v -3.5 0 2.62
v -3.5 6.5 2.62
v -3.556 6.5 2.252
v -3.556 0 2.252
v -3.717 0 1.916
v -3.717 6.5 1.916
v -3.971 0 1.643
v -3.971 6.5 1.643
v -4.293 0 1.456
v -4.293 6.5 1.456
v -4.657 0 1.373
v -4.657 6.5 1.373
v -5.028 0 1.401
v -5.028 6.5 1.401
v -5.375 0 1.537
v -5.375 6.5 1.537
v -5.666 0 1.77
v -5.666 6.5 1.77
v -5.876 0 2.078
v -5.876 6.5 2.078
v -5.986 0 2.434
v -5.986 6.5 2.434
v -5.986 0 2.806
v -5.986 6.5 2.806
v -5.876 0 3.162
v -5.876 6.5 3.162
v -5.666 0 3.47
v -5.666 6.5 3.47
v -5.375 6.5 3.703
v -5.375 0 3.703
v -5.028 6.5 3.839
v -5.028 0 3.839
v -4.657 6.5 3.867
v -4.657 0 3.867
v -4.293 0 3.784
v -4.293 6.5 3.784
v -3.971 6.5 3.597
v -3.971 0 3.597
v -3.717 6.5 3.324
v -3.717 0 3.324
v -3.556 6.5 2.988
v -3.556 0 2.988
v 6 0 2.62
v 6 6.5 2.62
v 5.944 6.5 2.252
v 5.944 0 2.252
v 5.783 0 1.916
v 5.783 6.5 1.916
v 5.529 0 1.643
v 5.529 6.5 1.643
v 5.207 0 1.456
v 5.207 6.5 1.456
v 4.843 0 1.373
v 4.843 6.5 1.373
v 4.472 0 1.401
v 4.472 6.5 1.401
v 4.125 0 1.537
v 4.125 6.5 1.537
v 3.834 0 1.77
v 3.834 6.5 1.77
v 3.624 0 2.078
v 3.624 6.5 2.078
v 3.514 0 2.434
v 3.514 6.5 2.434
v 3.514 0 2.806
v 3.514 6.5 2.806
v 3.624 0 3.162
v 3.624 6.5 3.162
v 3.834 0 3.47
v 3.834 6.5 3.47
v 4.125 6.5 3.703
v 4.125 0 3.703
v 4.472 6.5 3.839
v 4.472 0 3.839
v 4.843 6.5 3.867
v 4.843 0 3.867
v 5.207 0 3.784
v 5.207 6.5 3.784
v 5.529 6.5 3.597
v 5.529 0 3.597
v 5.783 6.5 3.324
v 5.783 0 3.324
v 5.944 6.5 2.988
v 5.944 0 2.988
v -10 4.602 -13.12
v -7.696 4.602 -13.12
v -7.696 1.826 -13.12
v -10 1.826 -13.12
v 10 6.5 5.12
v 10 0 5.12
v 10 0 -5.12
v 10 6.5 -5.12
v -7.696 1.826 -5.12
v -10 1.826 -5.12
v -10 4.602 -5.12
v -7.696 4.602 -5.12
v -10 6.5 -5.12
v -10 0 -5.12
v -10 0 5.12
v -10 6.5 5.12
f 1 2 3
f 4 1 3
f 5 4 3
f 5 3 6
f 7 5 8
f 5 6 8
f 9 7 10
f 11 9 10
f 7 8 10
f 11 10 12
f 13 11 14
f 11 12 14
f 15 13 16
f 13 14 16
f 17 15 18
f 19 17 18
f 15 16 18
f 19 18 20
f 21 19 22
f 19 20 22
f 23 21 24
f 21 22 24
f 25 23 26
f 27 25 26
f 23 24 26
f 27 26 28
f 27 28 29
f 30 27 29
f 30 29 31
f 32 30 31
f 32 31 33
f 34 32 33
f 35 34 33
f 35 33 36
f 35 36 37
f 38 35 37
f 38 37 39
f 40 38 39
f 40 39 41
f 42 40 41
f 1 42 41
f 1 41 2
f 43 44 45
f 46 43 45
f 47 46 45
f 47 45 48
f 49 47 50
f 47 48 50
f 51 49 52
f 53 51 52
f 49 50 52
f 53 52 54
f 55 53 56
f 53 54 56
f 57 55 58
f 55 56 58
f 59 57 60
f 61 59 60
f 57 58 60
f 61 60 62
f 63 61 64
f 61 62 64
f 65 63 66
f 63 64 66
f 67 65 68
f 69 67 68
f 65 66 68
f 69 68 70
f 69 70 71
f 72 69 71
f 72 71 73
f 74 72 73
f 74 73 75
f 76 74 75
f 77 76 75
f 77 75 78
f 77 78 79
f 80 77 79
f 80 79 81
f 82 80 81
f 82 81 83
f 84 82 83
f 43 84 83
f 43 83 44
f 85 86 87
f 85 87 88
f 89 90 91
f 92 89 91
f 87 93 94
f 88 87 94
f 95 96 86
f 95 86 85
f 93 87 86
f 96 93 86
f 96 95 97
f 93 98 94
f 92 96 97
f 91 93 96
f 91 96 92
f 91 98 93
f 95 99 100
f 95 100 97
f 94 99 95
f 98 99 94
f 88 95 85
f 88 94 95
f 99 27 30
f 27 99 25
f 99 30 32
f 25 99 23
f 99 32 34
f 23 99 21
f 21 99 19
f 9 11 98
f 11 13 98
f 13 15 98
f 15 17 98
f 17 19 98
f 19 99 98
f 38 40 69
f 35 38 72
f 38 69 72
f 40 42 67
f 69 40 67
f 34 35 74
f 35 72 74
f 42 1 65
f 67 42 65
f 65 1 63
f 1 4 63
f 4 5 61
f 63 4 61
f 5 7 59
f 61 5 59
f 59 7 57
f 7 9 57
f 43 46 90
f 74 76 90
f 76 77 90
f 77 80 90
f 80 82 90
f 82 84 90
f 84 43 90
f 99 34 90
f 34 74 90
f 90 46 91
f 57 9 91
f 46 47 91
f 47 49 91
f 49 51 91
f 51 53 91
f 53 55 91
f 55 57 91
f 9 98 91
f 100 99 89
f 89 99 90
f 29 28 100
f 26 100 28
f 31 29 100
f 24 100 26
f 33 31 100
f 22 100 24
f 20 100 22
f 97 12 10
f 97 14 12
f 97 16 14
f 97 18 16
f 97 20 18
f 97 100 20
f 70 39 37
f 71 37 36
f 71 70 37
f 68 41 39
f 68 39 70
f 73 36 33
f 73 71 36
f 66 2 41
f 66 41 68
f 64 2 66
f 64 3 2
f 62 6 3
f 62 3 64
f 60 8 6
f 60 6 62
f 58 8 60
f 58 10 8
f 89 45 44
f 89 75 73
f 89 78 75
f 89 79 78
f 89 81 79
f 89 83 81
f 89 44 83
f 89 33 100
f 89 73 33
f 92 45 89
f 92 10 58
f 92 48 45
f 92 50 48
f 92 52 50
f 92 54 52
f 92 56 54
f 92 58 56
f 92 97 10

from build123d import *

# Parameters (mm, degrees)
SKETCH_1_W          = 20
SKETCH_1_H          = 10.24
EXTRUDE_1_DEPTH     = 6.5
SKETCH_2_R          = 1.25
CUT_EXTRUDE_1_DEPTH = 7.5
SKETCH_4_W          = 2.303604444
SKETCH_4_H          = 2.775905185
EXTRUDE_2_DEPTH     = 8


with BuildPart() as part:
    # 草图1 → 凸台-拉伸1 (new body)
    with BuildSketch(Plane(origin=(0, 0, 0), x_dir=(1, 0, 0), z_dir=(0, 1, 0))):
        Rectangle(SKETCH_1_W, SKETCH_1_H)
    extrude(amount=EXTRUDE_1_DEPTH)

    # 草图2 → 切除-拉伸1 (cut, through all)
    with BuildSketch(Plane(origin=(0, 6.5, 0), x_dir=(1, 0, 0), z_dir=(0, 1, 0))):
        with Locations((-4.75, -2.62)):
            Circle(SKETCH_2_R)
        with Locations((4.75, -2.62)):
            Circle(SKETCH_2_R)
    extrude(amount=-CUT_EXTRUDE_1_DEPTH, mode=Mode.SUBTRACT)

    # 草图4 → 凸台-拉伸2 (add)
    with BuildSketch(Plane(origin=(0, 0, -5.12), x_dir=(-1, 0, 0), z_dir=(0, 0, -1))):
        with Locations((8.848197778, 3.213855402)):
            Rectangle(SKETCH_4_W, SKETCH_4_H)
    extrude(amount=EXTRUDE_2_DEPTH)


solid = part.part
